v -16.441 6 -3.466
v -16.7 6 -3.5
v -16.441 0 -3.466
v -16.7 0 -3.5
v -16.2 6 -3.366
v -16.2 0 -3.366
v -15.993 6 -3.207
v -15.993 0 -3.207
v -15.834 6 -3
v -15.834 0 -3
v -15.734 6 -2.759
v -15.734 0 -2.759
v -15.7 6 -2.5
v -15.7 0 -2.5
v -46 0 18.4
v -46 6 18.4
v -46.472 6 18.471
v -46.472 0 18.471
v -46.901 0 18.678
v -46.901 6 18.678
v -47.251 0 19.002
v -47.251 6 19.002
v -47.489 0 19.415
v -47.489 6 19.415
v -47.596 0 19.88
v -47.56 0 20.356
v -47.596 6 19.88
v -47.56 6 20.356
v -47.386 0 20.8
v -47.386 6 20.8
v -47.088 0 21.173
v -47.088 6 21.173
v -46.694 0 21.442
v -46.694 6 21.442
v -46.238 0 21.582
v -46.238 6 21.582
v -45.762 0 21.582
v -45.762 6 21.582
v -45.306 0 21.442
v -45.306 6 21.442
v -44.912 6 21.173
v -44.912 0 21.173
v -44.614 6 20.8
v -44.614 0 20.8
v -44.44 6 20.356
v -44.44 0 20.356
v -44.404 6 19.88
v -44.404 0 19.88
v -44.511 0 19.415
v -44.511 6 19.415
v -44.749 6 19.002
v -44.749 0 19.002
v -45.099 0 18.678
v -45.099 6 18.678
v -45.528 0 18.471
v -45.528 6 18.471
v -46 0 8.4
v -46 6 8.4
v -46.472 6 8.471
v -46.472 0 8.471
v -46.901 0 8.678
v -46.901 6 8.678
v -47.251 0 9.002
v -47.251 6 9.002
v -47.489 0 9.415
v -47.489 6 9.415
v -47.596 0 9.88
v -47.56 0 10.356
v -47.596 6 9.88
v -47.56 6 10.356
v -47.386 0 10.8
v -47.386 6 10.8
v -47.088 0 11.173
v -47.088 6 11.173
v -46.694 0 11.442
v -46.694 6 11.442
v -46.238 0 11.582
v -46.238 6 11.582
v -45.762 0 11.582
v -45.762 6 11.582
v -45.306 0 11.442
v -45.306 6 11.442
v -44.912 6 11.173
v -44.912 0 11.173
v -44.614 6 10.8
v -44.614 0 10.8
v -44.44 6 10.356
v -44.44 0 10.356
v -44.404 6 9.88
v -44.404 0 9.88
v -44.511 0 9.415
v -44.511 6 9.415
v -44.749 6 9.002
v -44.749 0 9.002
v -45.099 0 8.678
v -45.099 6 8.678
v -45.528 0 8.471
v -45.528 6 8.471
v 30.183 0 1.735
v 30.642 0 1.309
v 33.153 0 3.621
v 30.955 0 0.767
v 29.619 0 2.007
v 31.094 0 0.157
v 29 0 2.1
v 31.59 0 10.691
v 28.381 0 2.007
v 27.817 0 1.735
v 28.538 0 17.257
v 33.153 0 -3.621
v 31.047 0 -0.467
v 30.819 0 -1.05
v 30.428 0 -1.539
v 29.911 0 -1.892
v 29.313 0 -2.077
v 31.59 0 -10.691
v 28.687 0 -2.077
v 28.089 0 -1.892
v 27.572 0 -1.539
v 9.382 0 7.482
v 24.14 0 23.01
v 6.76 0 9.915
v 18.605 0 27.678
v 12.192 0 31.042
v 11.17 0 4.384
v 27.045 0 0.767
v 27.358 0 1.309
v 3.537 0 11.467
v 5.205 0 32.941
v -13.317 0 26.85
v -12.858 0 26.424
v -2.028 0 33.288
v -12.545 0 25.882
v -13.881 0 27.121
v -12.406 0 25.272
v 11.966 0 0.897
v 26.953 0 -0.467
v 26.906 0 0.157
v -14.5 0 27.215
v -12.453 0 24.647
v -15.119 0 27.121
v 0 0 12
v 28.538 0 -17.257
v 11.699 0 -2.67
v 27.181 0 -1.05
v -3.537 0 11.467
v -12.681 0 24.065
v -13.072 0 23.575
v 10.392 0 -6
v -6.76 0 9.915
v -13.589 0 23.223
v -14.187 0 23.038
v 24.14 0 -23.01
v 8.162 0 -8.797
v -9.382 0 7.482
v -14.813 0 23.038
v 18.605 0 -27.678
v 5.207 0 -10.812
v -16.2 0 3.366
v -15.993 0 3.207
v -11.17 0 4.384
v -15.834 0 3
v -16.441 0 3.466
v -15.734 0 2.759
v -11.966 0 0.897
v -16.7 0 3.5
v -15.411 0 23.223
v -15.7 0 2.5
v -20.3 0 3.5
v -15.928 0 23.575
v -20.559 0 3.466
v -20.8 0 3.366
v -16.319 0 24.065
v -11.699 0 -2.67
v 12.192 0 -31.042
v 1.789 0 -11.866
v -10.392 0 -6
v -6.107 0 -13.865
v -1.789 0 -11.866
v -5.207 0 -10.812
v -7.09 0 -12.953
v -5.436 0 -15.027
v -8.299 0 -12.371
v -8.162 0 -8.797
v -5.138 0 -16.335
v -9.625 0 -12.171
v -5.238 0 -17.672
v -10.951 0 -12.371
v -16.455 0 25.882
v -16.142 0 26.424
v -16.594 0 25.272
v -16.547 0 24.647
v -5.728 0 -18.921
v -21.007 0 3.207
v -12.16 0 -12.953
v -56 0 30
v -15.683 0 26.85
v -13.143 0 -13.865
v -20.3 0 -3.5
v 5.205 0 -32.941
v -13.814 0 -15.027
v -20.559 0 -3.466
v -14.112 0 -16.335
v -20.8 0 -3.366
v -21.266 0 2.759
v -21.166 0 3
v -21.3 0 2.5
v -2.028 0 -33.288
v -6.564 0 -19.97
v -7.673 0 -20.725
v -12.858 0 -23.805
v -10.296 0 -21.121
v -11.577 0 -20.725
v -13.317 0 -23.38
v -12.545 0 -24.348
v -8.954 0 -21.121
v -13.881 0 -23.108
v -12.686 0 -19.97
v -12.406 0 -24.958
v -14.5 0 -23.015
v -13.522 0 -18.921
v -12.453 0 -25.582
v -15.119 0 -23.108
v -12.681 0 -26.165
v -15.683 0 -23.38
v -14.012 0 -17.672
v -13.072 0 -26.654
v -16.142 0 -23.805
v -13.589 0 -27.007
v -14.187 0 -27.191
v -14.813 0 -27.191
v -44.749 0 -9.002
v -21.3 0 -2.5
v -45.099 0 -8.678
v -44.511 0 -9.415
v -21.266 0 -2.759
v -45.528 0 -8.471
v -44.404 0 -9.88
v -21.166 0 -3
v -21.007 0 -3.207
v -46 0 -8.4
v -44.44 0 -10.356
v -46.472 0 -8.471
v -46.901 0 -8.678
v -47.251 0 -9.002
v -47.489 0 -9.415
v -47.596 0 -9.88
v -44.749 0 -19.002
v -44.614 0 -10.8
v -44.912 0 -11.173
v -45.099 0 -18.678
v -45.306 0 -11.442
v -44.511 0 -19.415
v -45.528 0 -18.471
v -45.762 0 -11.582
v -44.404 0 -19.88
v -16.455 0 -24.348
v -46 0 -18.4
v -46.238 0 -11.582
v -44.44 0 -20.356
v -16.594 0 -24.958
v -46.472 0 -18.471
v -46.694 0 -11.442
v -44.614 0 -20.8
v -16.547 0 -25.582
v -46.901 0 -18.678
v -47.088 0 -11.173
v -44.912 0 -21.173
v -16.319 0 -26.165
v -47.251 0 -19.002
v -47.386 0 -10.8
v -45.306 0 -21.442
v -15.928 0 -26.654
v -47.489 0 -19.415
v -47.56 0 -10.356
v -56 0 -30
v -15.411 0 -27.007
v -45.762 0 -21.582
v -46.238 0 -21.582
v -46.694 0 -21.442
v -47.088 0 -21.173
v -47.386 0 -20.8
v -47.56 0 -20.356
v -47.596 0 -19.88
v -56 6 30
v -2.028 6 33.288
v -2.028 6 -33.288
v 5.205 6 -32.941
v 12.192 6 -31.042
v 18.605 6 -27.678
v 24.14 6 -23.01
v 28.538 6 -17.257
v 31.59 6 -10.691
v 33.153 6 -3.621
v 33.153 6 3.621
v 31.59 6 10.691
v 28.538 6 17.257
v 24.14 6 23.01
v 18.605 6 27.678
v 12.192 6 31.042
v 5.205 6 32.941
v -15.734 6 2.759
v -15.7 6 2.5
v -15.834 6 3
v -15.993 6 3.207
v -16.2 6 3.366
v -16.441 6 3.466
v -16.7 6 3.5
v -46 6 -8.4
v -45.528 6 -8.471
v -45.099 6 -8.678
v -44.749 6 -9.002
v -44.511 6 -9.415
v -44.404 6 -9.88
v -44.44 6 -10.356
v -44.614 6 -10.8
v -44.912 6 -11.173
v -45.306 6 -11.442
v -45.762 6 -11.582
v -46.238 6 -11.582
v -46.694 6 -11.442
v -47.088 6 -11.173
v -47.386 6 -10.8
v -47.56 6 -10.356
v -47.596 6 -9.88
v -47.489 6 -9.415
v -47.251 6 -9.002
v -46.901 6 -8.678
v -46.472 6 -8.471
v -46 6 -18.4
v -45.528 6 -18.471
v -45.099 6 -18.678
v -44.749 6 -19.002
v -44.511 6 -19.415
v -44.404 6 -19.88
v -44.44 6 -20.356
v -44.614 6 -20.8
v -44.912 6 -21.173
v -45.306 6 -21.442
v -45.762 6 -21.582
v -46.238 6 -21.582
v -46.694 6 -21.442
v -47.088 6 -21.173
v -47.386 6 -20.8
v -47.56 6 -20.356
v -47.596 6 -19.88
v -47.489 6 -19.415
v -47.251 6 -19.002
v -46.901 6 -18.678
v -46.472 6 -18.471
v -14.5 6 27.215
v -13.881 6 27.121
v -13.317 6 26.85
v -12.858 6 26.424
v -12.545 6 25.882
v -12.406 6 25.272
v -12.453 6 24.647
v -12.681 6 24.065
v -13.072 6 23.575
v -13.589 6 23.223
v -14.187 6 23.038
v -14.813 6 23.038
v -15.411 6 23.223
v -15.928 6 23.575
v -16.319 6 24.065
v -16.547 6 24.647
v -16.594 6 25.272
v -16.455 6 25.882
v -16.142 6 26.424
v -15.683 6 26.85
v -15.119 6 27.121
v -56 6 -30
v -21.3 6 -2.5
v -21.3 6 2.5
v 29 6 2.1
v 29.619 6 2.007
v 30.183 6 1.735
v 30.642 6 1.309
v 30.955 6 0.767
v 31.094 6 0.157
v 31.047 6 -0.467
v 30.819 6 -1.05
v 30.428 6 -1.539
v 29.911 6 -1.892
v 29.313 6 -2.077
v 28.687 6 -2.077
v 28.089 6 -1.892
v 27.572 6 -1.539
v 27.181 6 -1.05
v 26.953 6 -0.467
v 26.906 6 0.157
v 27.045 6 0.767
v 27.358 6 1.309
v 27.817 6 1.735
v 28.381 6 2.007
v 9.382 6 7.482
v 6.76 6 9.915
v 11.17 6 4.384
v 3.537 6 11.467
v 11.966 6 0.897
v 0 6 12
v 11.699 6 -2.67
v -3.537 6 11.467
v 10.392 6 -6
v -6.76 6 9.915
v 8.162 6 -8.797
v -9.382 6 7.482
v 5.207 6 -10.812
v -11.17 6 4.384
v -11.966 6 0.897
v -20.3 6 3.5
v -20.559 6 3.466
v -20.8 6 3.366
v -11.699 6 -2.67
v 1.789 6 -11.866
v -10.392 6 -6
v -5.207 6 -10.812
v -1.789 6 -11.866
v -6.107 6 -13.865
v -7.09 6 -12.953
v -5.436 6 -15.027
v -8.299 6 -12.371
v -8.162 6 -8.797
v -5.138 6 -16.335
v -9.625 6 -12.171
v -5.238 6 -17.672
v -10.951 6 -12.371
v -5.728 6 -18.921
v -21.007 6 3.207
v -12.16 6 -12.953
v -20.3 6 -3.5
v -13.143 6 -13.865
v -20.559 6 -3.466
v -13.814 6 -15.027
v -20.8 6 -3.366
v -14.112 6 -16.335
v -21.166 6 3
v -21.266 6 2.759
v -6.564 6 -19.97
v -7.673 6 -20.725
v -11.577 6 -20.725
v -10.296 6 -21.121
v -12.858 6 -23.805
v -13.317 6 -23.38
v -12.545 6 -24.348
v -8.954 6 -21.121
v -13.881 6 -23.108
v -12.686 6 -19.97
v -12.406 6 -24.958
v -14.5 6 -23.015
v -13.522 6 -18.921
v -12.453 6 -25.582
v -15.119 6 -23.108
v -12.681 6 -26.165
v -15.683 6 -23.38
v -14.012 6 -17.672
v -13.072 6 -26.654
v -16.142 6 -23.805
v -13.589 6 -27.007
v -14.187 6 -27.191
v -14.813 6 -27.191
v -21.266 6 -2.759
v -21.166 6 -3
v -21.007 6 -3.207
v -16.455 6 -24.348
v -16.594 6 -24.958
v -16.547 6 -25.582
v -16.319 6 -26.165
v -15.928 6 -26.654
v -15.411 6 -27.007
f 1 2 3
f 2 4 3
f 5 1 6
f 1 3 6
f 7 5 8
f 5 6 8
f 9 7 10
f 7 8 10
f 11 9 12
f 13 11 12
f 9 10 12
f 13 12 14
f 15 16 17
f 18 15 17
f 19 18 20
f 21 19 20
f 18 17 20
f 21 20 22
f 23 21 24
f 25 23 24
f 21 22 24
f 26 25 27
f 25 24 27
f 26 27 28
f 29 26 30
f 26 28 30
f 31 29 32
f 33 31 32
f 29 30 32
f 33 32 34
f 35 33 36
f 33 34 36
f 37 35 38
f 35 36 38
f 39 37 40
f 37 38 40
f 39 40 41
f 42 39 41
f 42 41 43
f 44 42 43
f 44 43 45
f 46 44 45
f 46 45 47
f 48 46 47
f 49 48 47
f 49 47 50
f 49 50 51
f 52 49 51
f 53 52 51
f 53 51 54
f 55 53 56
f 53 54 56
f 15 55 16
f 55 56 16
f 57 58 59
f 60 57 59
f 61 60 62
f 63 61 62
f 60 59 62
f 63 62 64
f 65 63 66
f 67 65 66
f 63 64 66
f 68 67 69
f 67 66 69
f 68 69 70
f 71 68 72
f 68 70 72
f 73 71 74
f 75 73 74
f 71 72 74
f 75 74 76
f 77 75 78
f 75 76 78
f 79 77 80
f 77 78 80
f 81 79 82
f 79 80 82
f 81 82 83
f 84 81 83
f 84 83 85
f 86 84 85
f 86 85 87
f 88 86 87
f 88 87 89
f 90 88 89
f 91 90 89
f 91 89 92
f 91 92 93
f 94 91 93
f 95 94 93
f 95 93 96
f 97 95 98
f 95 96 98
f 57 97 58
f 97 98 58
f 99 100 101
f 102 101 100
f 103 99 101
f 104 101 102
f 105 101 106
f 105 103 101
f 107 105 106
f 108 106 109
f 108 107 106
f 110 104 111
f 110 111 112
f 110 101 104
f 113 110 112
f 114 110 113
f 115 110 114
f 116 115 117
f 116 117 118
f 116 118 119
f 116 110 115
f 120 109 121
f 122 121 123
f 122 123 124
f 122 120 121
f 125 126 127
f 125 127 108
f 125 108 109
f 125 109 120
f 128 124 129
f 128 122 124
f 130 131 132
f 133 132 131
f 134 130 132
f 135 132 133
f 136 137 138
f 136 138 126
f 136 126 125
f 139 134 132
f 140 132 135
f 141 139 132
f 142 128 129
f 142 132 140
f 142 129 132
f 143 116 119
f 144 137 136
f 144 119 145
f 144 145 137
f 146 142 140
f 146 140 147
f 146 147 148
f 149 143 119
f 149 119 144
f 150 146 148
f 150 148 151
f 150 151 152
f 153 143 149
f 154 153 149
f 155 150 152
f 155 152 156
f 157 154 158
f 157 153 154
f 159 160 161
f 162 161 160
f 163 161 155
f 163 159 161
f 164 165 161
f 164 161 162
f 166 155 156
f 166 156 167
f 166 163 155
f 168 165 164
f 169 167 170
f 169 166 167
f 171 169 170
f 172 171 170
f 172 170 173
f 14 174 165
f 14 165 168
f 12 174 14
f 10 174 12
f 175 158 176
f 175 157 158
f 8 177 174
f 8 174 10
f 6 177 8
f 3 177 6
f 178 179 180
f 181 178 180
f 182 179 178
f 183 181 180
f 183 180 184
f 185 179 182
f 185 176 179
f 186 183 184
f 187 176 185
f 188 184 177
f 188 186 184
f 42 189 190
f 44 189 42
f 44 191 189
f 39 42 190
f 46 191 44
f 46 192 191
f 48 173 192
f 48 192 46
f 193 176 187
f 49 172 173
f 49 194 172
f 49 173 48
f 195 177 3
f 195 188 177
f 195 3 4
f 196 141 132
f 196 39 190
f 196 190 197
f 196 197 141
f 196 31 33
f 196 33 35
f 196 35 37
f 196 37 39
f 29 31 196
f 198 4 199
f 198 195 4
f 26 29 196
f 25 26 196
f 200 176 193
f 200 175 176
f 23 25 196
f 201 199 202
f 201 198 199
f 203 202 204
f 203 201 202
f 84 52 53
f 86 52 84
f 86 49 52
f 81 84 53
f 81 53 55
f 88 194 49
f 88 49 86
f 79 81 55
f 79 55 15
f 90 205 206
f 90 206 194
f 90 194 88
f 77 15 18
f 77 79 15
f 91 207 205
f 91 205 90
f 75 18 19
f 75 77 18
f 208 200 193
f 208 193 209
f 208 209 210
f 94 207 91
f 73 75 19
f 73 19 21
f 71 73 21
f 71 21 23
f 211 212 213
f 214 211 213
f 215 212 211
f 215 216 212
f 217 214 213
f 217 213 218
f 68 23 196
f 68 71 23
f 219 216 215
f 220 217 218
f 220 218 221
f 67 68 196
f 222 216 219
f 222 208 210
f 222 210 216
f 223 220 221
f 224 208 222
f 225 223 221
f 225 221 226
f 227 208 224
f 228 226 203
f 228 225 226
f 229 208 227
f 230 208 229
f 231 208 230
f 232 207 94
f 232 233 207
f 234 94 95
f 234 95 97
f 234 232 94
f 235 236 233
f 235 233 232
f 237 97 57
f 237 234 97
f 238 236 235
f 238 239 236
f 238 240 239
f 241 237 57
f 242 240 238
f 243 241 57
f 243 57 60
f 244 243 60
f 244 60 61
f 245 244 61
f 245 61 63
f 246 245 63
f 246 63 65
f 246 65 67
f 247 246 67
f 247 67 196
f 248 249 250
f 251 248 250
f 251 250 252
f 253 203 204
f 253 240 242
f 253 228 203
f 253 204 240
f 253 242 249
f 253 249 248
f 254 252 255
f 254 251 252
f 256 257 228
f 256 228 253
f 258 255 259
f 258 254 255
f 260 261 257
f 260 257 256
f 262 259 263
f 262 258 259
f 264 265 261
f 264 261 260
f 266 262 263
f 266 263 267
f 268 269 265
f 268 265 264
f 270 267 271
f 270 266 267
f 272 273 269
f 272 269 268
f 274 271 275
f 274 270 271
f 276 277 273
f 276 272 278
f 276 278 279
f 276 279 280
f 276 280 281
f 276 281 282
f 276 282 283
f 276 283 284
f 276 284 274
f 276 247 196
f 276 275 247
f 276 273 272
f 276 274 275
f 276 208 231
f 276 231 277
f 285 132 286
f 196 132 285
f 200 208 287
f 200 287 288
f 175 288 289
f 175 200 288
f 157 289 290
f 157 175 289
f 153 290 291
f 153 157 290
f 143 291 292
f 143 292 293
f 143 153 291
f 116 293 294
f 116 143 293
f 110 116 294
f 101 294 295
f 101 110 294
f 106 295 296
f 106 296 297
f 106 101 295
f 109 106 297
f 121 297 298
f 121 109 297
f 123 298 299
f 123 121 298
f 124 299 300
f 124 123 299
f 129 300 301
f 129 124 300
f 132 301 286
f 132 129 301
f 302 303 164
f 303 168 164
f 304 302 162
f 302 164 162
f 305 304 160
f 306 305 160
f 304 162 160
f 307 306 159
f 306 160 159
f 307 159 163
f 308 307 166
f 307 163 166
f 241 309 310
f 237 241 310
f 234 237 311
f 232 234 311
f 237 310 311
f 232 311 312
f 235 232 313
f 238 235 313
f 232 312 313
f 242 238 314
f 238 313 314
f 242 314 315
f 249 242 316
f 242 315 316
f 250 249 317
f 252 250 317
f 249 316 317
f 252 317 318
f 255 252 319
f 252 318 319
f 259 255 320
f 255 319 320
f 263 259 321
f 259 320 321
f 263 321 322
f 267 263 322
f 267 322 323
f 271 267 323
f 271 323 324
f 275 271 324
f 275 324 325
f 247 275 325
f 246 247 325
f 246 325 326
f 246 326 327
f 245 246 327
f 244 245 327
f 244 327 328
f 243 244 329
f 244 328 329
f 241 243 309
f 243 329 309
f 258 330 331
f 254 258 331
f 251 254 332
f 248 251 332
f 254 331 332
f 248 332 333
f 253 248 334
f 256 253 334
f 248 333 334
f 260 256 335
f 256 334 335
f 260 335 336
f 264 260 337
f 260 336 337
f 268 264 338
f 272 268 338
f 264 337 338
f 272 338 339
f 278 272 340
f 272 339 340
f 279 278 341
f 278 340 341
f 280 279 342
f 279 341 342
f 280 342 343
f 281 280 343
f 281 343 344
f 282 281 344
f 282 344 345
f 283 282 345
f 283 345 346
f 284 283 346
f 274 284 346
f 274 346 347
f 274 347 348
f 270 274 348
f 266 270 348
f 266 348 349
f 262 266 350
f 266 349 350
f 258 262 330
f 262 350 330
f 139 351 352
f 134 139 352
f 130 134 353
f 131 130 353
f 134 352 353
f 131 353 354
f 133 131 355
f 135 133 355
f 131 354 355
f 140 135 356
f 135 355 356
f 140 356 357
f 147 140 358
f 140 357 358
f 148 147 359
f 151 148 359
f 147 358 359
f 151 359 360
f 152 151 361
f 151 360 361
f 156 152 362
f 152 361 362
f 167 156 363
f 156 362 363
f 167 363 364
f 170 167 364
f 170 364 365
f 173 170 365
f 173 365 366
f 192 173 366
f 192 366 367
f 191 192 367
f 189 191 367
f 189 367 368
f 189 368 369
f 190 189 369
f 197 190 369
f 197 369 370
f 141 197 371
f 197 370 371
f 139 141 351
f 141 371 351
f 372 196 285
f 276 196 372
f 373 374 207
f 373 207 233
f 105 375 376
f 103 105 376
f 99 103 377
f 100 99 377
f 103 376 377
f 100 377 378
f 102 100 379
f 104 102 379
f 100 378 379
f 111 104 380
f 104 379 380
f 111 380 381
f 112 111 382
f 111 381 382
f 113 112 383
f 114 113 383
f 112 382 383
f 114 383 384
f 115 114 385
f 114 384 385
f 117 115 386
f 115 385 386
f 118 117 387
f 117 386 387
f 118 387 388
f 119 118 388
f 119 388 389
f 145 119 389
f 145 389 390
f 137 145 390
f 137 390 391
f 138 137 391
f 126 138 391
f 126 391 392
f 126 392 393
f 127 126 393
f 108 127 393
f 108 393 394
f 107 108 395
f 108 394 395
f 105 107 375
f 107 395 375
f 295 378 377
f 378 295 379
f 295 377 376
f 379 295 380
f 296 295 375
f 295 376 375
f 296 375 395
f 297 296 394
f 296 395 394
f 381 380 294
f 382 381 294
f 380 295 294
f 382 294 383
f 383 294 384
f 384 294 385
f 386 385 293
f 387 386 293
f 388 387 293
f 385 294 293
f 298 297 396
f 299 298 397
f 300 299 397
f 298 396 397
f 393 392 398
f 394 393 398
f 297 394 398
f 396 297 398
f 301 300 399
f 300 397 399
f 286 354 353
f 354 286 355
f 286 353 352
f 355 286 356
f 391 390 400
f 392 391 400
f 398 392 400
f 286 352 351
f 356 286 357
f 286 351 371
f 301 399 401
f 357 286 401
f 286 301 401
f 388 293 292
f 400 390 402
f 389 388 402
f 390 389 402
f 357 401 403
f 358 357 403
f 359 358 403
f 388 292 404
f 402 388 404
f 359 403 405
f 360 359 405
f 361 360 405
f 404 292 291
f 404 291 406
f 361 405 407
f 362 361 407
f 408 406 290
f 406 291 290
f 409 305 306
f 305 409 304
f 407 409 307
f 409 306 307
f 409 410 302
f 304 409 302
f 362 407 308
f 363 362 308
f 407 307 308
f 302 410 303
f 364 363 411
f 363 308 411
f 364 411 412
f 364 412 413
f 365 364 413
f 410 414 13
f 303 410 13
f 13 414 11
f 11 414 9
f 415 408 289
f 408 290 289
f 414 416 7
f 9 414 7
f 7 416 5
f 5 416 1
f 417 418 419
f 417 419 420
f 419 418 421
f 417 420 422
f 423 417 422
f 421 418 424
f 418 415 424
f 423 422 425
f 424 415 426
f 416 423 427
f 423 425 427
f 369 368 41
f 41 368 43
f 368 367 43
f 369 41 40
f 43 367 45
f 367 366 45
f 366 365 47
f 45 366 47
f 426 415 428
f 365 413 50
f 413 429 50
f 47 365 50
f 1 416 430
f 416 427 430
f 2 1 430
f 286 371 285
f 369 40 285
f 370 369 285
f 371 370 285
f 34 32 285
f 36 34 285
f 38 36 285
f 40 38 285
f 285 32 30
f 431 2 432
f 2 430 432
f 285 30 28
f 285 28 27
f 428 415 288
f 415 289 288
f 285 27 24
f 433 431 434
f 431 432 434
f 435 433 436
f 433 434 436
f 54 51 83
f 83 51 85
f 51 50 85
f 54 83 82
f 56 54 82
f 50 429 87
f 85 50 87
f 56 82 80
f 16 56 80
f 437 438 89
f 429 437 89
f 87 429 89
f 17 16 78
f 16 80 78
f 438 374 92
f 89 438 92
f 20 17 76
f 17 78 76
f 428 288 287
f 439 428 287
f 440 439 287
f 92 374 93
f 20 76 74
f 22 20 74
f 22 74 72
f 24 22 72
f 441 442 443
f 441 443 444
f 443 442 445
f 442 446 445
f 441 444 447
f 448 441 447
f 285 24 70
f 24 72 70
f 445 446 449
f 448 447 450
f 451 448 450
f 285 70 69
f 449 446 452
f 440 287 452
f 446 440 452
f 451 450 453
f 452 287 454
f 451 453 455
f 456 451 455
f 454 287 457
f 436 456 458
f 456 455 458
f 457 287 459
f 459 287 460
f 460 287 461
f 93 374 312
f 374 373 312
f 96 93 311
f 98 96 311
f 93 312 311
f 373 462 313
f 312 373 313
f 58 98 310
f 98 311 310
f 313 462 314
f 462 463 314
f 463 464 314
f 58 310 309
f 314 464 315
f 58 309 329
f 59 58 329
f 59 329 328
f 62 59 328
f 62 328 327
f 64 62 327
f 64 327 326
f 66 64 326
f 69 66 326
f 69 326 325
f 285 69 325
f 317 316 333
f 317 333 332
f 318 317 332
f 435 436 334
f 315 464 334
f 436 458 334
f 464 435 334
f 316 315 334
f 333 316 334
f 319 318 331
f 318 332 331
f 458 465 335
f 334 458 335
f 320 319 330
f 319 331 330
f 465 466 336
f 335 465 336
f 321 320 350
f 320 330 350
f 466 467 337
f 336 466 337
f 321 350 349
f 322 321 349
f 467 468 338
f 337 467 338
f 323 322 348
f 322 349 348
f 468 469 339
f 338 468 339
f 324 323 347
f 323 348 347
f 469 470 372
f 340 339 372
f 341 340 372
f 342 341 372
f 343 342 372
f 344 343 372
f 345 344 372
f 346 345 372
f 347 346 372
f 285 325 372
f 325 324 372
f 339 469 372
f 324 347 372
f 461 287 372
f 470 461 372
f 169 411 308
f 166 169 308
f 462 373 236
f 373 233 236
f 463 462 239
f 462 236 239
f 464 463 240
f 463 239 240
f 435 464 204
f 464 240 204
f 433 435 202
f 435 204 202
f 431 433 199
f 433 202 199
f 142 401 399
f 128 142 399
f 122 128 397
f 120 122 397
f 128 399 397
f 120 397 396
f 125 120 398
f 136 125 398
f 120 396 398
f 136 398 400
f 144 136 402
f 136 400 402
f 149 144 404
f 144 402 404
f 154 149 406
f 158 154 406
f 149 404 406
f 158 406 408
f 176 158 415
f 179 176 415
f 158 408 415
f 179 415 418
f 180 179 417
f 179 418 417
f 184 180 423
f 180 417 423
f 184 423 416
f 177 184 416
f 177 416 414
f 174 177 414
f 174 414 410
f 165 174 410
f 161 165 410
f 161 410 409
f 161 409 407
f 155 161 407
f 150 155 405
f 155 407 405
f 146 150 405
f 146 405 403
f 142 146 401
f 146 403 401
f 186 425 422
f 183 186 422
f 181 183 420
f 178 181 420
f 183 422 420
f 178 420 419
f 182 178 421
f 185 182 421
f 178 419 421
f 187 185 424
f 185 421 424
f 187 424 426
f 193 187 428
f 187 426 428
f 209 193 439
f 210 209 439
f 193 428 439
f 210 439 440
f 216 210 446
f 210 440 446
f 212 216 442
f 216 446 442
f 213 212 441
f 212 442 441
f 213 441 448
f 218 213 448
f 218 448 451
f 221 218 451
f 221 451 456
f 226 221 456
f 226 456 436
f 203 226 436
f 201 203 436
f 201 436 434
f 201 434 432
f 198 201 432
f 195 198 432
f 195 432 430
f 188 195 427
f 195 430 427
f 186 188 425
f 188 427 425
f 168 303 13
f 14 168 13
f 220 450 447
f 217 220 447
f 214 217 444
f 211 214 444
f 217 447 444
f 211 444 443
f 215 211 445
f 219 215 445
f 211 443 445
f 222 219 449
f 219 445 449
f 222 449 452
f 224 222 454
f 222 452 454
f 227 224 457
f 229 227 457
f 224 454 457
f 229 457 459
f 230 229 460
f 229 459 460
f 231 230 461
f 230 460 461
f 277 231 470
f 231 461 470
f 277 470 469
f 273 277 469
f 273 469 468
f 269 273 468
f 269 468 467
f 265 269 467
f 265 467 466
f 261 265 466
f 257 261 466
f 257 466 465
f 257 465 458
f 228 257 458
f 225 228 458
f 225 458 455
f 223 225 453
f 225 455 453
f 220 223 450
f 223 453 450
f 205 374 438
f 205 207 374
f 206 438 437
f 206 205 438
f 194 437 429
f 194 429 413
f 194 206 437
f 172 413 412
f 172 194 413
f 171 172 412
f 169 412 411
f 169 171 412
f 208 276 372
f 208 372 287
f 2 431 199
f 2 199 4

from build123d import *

# Parameters (mm, degrees)
EXTRUDE_1_DEPTH     = 6
SKETCH_4_R          = 12
CUT_EXTRUDE_2_DEPTH = 6
SKETCH_5_R          = 1.6
CUT_EXTRUDE_3_DEPTH = 6
SKETCH_6_R          = 4.5
SKETCH_6_R_2        = 2.1
CUT_EXTRUDE_4_DEPTH = 6
SKETCH_7_W          = 5.6
SKETCH_7_H          = 7
CUT_EXTRUDE_5_DEPTH = 6
FILLET_2_R          = 1


with BuildPart() as part:
    # 草图1 → 凸台-拉伸1 (new body)
    with BuildSketch(Plane(origin=(0, 0, 0), x_dir=(1, 0, 0), z_dir=(0, 1, 0))):
        with BuildLine():
            Line((-56, -30), (-56, 30))
            Line((-56, 30), (-2.028111517, 33.288275168))
            ThreePointArc((-2.028111517, 33.288275168), (33.35, 0), (-2.028111517, -33.288275168))
            Line((-2.028111517, -33.288275168), (-56, -30))
        make_face()
    extrude(amount=EXTRUDE_1_DEPTH)

    # 草图4 → 切除-拉伸2 (cut)
    with BuildSketch(Plane(origin=(0, 6, 0), x_dir=(1, 0, 0), z_dir=(0, 1, 0))):
        with Locations(Location((0, 0, 0), (0, 0, 270))):
            Circle(SKETCH_4_R)
    extrude(amount=-CUT_EXTRUDE_2_DEPTH, mode=Mode.SUBTRACT)

    # 草图5 → 切除-拉伸3 (cut)
    with BuildSketch(Plane(origin=(0, 6, 0), x_dir=(1, 0, 0), z_dir=(0, 1, 0))):
        with Locations(Location((-46, 20, 0), (0, 0, 270))):
            Circle(SKETCH_5_R)
        with Locations(Location((-46, 10, 0), (0, 0, 270))):
            Circle(SKETCH_5_R)
        with Locations(Location((-46, -20, 0), (0, 0, 90))):
            Circle(SKETCH_5_R)
        with Locations(Location((-46, -10, 0), (0, 0, 90))):
            Circle(SKETCH_5_R)
    extrude(amount=-CUT_EXTRUDE_3_DEPTH, mode=Mode.SUBTRACT)

    # 草图6 → 切除-拉伸4 (cut)
    with BuildSketch(Plane(origin=(0, 6, 0), x_dir=(1, 0, 0), z_dir=(0, 1, 0))):
        with Locations(Location((-9.625, 16.670989023, 0), (0, 0, 270))):
            Circle(SKETCH_6_R)
        with Locations(Location((29, 0, 0), (0, 0, 270))):
            Circle(SKETCH_6_R_2)
        with Locations(Location((-14.5, -25.11473671, 0), (0, 0, 270))):
            Circle(SKETCH_6_R_2)
        with Locations(Location((-14.5, 25.11473671, 0), (0, 0, 270))):
            Circle(SKETCH_6_R_2)
    extrude(amount=-CUT_EXTRUDE_4_DEPTH, mode=Mode.SUBTRACT)

    # 草图7 → 切除-拉伸5 (cut)
    with BuildSketch(Plane(origin=(0, 6, 0), x_dir=(1, 0, 0), z_dir=(0, 1, 0))):
        with Locations((-18.5, 0)):
            Rectangle(SKETCH_7_W, SKETCH_7_H)
    extrude(amount=-CUT_EXTRUDE_5_DEPTH, mode=Mode.SUBTRACT)

    # 圆角2
    fillet_2_edges = [part.edges().sort_by_distance(p)[0] for p in [
        (-15.7, 3, 3.5),
        (-15.7, 3, -3.5),
        (-21.3, 3, -3.5),
        (-21.3, 3, 3.5),
    ]]
    fillet(fillet_2_edges, radius=FILLET_2_R)


solid = part.part
